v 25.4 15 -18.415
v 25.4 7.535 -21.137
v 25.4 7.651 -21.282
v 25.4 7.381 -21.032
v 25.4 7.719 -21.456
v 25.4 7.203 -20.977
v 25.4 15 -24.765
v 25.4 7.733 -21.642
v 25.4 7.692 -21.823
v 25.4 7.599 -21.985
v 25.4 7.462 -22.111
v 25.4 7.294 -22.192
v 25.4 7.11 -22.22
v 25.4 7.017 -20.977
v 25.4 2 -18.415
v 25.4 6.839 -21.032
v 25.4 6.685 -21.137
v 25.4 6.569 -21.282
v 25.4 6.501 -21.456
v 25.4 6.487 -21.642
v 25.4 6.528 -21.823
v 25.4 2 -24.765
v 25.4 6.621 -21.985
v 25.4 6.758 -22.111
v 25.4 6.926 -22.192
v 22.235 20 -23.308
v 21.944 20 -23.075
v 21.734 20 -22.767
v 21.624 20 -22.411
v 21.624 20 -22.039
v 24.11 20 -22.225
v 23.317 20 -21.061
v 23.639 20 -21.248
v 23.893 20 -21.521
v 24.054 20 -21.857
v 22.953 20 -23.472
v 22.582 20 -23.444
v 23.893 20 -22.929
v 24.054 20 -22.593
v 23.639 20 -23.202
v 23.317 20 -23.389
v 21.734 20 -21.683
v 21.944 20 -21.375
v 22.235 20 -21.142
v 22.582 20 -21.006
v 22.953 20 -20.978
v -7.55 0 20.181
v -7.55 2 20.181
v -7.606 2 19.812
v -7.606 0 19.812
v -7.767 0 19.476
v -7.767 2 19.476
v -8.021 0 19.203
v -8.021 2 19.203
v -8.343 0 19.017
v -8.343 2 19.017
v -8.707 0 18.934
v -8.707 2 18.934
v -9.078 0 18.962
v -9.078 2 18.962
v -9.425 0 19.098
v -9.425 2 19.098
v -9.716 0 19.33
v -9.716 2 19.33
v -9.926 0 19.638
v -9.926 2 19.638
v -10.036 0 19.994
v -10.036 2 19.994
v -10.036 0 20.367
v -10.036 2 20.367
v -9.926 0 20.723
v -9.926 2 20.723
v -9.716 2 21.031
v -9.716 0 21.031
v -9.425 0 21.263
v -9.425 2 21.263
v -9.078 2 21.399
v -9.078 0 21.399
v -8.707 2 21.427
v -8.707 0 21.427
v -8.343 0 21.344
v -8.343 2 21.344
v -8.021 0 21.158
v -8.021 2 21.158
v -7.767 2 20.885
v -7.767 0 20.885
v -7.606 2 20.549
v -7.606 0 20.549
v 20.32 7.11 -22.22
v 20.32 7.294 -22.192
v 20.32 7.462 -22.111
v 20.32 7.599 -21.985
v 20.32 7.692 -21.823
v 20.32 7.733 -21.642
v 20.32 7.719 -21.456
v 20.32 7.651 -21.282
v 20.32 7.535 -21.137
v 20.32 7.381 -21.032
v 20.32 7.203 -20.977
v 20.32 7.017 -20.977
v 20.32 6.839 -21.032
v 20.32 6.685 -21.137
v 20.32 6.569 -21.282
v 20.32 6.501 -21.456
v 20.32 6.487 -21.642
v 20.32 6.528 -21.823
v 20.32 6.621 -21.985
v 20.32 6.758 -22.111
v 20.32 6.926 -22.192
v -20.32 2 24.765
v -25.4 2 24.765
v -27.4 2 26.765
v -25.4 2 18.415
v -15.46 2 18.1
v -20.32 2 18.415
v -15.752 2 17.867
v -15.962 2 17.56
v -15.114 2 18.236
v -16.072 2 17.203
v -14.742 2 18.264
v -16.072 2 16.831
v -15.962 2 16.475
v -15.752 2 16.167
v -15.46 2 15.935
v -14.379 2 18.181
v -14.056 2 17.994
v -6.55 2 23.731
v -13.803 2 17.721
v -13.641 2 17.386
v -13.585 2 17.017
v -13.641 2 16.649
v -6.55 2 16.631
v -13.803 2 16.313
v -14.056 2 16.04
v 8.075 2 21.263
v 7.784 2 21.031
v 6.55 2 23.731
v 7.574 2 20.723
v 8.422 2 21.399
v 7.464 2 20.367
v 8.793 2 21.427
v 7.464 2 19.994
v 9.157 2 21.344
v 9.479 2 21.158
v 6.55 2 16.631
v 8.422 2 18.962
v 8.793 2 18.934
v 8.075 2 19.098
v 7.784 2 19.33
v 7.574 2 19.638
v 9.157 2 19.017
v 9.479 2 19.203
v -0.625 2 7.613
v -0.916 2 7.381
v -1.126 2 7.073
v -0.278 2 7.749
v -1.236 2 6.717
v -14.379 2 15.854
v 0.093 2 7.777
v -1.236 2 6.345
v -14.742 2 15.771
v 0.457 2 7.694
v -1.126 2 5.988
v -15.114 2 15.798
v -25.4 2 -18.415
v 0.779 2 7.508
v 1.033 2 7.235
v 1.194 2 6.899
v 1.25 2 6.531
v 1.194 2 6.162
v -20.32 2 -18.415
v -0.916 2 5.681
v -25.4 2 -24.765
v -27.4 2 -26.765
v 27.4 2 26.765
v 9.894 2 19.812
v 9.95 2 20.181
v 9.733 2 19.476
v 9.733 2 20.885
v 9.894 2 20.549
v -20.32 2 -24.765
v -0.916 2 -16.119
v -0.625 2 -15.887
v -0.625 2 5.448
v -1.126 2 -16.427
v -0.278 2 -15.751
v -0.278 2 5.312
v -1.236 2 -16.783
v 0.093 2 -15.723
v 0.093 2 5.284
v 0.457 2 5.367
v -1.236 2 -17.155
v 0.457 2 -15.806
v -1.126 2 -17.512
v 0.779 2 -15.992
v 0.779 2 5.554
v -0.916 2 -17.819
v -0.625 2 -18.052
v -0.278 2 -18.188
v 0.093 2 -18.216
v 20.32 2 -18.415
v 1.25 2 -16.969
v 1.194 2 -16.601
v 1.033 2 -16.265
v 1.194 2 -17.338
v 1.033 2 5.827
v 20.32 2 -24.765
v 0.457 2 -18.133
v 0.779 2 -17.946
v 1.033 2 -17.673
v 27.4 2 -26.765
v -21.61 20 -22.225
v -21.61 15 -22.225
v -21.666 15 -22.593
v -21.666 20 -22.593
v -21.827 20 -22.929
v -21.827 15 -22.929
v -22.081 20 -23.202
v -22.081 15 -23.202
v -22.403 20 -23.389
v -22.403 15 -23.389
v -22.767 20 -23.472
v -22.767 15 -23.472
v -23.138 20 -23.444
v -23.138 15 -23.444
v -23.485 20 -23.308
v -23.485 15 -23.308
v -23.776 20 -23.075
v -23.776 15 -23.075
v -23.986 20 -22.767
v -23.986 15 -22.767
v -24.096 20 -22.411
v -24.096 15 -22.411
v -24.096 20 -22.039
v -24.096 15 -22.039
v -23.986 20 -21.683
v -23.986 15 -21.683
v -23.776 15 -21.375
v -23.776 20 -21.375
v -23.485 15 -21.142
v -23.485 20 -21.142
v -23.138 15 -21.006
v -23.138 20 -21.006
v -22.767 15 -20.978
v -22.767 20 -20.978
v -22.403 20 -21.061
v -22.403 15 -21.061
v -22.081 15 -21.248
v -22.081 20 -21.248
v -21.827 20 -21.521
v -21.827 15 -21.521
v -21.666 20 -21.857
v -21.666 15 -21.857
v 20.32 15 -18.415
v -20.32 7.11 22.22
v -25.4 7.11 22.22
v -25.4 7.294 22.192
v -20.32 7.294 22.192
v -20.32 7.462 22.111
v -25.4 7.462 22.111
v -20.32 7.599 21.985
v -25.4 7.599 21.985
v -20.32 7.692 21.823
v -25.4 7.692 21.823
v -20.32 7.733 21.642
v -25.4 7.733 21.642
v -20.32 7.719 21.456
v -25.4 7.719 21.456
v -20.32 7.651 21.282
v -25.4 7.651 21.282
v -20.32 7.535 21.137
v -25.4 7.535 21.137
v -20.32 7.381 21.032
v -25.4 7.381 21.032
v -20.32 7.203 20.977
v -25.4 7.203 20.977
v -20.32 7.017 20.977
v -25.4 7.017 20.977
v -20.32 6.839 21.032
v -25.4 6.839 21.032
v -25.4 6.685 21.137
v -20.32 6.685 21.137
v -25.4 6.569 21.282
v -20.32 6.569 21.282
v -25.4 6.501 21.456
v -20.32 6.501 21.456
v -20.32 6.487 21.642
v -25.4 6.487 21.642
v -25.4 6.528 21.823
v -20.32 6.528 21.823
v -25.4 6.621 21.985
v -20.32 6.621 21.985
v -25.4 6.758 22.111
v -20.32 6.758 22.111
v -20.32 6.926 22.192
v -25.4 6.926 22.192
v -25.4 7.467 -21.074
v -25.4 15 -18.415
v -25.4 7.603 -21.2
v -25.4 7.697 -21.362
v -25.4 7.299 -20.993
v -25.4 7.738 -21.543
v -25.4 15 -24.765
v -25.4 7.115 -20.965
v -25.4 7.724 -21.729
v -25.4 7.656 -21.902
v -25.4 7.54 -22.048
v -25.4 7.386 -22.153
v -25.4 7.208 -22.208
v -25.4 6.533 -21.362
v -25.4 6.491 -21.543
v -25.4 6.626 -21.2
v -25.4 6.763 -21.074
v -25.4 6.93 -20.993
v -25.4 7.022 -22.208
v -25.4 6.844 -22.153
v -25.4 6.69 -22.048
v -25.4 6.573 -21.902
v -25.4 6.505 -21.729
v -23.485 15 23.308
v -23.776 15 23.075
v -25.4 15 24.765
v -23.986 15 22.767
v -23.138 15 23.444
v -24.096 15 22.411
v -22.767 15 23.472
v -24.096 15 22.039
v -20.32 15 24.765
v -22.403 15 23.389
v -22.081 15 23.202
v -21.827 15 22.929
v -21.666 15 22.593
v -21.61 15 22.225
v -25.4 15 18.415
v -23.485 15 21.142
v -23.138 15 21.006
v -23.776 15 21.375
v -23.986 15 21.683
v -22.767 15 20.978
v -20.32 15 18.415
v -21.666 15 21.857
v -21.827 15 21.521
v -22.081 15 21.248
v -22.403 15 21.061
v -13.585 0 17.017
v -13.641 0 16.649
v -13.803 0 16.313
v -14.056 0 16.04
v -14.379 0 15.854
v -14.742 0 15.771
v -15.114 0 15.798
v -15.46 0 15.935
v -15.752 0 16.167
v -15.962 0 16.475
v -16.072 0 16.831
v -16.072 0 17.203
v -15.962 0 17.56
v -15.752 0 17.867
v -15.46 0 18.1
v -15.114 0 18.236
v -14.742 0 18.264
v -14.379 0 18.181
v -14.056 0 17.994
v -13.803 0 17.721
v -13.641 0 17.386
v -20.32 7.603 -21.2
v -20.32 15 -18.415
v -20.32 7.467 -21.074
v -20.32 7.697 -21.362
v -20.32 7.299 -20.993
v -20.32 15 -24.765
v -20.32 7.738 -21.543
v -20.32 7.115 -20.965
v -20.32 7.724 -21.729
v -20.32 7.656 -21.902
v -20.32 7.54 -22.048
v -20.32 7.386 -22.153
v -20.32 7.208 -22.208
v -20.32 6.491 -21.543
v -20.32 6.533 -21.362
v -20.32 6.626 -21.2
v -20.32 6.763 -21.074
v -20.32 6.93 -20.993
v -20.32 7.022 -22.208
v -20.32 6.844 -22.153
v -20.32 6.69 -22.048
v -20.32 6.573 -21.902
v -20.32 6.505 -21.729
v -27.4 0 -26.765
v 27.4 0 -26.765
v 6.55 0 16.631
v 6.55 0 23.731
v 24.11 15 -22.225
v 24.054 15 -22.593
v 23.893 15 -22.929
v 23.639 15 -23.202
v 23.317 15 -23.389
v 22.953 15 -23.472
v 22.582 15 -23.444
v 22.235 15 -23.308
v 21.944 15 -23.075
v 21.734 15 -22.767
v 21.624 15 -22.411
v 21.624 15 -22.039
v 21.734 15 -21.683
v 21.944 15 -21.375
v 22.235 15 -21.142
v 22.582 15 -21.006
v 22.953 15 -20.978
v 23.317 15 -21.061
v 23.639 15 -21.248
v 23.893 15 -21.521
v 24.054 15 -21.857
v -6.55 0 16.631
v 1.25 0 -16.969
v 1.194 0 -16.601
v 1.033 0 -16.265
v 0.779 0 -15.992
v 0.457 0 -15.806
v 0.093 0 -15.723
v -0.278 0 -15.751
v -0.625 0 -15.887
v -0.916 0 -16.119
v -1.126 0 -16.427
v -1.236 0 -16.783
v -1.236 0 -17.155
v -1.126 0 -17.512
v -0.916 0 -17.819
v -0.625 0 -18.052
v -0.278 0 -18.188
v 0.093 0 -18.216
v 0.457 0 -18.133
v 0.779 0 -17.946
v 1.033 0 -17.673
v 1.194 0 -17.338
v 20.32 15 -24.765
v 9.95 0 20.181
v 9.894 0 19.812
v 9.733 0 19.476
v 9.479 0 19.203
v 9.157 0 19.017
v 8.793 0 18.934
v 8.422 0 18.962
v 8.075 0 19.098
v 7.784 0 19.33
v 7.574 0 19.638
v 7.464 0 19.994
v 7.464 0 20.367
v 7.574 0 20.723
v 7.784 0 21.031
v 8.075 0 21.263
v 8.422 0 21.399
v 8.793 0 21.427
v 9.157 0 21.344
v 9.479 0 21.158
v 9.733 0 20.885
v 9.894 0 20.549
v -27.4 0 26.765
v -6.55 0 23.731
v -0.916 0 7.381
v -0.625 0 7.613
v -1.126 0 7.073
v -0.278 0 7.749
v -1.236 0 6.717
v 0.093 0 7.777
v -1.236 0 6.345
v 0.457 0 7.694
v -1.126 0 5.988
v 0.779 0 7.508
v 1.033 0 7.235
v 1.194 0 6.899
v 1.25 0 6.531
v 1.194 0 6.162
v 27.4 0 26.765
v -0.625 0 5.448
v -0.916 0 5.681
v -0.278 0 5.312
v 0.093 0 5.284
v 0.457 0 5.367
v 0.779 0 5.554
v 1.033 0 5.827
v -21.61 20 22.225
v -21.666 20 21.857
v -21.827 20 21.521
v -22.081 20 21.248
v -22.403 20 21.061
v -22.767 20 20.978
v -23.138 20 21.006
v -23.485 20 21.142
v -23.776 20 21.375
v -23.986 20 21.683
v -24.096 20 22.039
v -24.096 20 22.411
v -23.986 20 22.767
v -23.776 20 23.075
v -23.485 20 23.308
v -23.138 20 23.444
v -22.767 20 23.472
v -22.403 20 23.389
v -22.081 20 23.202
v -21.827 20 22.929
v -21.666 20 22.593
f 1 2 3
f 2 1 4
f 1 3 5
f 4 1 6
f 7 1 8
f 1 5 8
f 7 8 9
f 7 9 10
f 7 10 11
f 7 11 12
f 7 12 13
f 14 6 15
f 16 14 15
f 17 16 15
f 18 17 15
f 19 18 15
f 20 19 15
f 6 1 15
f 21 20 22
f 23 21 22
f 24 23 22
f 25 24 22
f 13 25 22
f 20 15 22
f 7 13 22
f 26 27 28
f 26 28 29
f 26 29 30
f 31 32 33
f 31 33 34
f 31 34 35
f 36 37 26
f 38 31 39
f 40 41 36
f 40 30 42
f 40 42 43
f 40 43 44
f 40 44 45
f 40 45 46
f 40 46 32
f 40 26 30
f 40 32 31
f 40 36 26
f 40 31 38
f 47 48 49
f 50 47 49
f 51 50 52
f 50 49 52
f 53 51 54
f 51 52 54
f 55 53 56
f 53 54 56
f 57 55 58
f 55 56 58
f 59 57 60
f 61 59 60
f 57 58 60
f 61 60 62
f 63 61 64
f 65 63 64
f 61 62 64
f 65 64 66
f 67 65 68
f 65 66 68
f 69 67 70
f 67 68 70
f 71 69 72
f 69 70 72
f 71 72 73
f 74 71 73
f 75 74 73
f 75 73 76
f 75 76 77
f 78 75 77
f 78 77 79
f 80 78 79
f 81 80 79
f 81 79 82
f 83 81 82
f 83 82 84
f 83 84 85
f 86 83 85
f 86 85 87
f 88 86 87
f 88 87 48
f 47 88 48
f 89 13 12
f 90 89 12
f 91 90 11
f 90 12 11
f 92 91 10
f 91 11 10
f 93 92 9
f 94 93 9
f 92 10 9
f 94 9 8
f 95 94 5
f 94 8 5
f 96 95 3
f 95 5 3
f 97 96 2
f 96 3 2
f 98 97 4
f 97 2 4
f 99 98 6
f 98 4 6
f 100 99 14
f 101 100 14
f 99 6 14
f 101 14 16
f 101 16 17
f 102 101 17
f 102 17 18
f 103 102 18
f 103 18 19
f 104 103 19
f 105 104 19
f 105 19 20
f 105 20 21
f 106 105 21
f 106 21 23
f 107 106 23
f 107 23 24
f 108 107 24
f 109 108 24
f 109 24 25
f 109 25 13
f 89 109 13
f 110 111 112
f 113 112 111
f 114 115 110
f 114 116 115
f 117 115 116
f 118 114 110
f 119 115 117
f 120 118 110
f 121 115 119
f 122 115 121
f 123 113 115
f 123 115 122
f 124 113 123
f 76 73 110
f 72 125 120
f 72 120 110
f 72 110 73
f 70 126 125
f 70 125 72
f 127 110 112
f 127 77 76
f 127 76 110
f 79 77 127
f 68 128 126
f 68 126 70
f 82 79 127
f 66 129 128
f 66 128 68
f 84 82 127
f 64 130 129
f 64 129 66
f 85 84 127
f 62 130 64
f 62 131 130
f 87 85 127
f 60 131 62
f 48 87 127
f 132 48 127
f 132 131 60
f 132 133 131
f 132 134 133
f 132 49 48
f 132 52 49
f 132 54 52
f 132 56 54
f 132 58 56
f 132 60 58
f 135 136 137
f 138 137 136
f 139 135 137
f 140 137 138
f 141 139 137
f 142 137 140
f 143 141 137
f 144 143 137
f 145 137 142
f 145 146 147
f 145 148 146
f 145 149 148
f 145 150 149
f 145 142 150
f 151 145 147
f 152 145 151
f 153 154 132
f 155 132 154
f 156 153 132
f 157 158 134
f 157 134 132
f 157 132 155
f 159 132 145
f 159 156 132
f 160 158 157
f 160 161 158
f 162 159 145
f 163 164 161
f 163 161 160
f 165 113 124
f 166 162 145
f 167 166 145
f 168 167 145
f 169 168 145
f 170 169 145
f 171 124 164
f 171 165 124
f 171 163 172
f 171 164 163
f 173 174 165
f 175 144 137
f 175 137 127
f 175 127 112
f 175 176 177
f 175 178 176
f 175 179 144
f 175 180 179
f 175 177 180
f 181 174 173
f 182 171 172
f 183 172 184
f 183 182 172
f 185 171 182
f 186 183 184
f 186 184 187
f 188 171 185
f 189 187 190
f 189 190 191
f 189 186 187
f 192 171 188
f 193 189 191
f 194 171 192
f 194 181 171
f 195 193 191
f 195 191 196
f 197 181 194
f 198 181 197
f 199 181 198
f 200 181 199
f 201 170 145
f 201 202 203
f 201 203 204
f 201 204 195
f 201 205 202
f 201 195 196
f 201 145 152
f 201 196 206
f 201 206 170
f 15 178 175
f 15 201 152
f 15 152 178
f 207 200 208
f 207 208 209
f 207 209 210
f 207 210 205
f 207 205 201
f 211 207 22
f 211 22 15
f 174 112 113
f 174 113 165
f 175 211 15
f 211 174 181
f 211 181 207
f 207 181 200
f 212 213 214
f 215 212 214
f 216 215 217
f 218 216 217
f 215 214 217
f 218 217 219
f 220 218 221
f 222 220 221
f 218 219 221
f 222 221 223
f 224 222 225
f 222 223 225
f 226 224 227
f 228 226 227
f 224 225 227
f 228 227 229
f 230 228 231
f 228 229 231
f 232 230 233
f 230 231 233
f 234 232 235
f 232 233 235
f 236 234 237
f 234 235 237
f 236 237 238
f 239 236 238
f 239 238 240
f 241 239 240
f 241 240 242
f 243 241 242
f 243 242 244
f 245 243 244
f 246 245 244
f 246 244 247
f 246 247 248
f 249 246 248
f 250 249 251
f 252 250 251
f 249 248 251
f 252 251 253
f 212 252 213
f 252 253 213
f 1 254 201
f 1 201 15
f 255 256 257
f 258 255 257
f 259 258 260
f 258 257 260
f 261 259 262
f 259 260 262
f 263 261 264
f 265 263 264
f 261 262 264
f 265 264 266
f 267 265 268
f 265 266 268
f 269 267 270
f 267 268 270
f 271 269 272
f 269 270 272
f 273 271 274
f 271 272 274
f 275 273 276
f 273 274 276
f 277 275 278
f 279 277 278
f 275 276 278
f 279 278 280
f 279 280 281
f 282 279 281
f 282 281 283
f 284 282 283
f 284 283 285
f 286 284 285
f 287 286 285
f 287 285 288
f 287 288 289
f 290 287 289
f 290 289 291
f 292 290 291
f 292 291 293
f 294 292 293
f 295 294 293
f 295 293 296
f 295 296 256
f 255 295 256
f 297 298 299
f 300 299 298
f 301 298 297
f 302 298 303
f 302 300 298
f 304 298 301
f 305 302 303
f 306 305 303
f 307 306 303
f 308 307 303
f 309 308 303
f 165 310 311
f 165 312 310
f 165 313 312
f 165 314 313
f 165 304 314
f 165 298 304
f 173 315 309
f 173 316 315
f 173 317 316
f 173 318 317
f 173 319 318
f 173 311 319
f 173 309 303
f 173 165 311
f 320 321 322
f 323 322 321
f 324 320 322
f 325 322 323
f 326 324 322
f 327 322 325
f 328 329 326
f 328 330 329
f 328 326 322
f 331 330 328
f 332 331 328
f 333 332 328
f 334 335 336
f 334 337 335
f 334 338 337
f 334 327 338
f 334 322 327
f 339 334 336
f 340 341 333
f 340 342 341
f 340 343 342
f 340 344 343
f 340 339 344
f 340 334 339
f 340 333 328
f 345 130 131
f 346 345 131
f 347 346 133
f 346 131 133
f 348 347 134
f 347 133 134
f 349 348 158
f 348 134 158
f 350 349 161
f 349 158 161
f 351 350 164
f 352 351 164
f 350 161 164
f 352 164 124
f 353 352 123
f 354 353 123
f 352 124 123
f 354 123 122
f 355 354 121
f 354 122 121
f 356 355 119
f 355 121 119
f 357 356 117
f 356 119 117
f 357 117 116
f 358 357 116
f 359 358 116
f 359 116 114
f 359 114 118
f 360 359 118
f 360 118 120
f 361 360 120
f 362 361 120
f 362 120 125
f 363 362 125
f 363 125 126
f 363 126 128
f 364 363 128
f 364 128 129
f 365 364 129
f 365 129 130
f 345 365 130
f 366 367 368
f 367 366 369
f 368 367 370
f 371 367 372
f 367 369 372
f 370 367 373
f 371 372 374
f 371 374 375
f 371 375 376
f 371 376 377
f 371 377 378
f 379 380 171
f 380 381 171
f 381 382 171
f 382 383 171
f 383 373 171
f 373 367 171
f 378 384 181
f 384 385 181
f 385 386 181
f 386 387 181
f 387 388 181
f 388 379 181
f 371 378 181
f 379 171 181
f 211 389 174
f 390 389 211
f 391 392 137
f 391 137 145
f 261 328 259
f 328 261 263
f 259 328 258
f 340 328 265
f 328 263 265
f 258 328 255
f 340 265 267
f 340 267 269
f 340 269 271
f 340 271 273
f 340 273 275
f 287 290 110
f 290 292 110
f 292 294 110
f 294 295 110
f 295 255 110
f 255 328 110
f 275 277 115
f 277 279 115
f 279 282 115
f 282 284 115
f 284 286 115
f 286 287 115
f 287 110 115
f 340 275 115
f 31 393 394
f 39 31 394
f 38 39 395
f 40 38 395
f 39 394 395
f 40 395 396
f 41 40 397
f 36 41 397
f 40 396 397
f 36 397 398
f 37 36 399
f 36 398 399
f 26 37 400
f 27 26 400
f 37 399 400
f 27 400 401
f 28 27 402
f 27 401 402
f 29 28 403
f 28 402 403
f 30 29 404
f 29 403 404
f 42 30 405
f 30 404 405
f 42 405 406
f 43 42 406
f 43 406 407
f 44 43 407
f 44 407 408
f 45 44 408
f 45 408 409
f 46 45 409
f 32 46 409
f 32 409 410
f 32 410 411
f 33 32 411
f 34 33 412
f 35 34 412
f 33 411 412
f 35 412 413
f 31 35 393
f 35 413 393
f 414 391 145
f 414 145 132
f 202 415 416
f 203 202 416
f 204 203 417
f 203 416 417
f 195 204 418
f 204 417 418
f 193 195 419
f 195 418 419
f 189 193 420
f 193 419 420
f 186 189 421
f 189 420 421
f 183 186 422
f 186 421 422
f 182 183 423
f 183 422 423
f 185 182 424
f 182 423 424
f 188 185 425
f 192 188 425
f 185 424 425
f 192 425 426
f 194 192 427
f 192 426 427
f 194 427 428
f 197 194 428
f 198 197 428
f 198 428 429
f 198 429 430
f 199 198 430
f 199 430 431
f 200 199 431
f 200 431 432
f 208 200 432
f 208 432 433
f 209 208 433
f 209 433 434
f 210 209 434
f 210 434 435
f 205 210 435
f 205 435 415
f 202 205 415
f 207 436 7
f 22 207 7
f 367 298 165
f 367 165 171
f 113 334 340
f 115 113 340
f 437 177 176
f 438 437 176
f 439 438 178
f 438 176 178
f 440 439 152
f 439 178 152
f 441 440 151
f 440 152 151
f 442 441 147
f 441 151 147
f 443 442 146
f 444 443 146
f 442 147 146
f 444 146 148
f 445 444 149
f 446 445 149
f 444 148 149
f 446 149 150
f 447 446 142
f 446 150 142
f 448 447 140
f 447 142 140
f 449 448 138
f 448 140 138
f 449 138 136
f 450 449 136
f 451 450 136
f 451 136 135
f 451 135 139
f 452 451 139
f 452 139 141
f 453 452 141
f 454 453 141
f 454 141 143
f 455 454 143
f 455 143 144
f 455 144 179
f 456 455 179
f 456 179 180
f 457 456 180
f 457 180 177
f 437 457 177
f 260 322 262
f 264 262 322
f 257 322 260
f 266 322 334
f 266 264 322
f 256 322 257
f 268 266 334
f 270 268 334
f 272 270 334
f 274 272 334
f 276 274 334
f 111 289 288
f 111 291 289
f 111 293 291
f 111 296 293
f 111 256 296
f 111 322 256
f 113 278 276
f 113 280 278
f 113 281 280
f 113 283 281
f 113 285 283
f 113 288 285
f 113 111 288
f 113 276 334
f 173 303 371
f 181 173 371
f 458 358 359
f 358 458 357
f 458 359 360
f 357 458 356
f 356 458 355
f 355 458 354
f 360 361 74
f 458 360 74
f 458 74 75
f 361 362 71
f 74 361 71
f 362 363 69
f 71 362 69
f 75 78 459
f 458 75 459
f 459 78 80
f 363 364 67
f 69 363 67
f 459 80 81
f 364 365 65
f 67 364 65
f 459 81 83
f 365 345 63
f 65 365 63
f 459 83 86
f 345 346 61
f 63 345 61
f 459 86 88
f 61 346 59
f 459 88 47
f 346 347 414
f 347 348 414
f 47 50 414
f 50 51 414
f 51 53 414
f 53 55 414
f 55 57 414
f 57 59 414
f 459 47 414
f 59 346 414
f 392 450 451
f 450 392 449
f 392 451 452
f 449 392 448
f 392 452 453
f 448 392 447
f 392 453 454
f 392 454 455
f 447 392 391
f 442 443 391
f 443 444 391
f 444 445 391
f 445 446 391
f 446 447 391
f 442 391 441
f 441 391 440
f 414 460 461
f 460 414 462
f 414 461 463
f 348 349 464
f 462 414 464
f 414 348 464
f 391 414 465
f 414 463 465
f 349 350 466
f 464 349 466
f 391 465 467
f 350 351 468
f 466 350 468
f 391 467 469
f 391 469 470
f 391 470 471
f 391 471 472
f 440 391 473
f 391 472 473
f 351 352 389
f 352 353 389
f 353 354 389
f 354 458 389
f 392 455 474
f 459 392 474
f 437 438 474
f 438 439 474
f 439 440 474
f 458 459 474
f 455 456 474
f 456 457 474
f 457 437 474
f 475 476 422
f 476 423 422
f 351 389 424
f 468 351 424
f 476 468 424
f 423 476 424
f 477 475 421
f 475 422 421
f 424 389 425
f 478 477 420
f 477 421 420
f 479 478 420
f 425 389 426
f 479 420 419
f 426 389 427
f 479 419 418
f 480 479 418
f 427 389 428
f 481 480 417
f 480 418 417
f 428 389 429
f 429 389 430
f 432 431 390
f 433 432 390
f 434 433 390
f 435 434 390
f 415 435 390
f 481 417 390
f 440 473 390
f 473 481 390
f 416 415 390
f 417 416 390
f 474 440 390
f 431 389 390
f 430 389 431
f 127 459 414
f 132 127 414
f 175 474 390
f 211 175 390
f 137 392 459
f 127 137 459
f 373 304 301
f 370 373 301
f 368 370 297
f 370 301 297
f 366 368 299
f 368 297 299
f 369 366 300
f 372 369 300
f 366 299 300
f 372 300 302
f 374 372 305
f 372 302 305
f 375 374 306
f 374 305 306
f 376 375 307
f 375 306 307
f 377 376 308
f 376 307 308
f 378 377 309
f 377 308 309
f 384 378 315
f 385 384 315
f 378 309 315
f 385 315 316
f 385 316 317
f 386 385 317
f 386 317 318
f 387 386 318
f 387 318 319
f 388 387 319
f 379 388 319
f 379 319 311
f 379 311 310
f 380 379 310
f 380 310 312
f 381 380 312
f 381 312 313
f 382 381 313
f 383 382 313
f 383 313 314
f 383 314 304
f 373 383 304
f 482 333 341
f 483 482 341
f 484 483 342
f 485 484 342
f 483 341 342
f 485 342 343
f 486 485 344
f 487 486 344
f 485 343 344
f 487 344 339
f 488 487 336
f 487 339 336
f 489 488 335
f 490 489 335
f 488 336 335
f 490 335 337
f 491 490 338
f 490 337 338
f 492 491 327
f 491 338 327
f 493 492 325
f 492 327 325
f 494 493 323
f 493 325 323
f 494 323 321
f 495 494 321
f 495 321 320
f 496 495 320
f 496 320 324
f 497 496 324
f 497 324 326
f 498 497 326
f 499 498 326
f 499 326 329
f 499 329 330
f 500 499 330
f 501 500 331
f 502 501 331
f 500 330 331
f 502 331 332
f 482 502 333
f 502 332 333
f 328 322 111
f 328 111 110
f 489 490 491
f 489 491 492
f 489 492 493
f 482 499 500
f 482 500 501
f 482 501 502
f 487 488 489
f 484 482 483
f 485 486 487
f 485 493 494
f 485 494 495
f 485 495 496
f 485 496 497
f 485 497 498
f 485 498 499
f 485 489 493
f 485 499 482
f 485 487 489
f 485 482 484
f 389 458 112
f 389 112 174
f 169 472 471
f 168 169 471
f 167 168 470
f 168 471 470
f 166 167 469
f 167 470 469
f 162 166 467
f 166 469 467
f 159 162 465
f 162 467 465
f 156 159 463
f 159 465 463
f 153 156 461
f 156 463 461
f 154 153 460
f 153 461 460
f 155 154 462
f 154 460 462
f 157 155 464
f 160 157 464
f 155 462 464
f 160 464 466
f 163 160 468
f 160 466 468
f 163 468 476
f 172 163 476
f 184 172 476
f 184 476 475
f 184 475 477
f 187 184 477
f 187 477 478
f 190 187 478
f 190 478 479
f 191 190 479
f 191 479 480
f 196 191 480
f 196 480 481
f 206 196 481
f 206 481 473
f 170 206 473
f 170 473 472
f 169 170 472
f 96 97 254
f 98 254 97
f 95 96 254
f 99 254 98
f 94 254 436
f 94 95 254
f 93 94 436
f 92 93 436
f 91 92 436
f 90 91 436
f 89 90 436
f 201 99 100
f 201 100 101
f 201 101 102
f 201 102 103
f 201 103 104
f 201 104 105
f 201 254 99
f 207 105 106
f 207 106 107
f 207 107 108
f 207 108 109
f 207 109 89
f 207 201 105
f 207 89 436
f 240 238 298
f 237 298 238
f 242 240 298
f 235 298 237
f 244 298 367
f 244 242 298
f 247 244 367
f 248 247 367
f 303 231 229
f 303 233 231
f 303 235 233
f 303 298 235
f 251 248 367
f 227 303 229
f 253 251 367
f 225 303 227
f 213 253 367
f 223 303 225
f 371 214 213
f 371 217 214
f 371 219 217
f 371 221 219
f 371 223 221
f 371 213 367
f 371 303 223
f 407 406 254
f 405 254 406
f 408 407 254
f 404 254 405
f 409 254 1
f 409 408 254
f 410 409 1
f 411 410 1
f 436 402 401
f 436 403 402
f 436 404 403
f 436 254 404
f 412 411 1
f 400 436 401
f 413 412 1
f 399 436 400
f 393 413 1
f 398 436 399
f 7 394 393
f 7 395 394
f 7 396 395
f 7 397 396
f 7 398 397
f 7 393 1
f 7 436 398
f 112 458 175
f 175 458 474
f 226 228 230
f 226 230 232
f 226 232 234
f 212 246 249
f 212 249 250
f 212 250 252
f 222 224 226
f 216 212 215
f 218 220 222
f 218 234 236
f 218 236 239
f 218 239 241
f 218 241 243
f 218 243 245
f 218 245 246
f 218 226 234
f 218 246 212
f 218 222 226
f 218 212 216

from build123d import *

# Parameters (mm, degrees)
SKETCH2_W           = 54.8
SKETCH2_H           = 53.53
BOSS_EXTRUDE1_DEPTH = 2
SKETCH3_W           = 5.08
SKETCH3_H           = 6.35
BOSS_EXTRUDE2_DEPTH = 13
SKETCH6_R           = 1.25
BOSS_EXTRUDE3_DEPTH = 5
CUT_EXTRUDE1_REACH  = 22
SKETCH7_W           = 13.1
SKETCH7_H           = 7.1
CUT_EXTRUDE2_REACH  = 22
SKETCH8_R           = 1.25
CUT_EXTRUDE4_REACH  = 54.8
SKETCH9_R           = 0.625
CUT_EXTRUDE5_REACH  = 54.8
SKETCH10_R          = 0.625
CUT_EXTRUDE6_REACH  = 54.8
SKETCH11_R          = 0.625
CUT_EXTRUDE7_REACH  = 4
SKETCH12_R          = 1.25
CUT_EXTRUDE8_REACH  = 4
SKETCH13_R          = 1.25


with BuildPart() as part:
    # Sketch2 → Boss-Extrude1 (new body)
    with BuildSketch(Plane(origin=(0, 0, 0), x_dir=(1, 0, 0), z_dir=(0, 1, 0))):
        Rectangle(SKETCH2_W, SKETCH2_H)
    extrude(amount=BOSS_EXTRUDE1_DEPTH)

    # Sketch3 → Boss-Extrude2 (add)
    with BuildSketch(Plane(origin=(0, 2, 0), x_dir=(1, 0, 0), z_dir=(0, 1, 0))):
        with Locations((-22.86, 21.59)):
            Rectangle(SKETCH3_W, SKETCH3_H)
        with Locations((22.86, 21.59)):
            Rectangle(SKETCH3_W, SKETCH3_H)
        with Locations((-22.86, -21.59)):
            Rectangle(SKETCH3_W, SKETCH3_H)
    extrude(amount=BOSS_EXTRUDE2_DEPTH)

    # Sketch6 → Boss-Extrude3 (add)
    with BuildSketch(Plane(origin=(0, 15, 0), x_dir=(1, 0, 0), z_dir=(0, 1, 0))):
        with Locations((-22.86, 22.225)):
            Circle(SKETCH6_R)
        with Locations((22.86, 22.225)):
            Circle(SKETCH6_R)
        with Locations((-22.86, -22.225)):
            Circle(SKETCH6_R)
    extrude(amount=BOSS_EXTRUDE3_DEPTH)

    # Sketch7 → Cut-Extrude1 (cut, up to next)
    with BuildSketch(Plane(origin=(0, 0, 0), x_dir=(-1, 0, 0), z_dir=(0, -1, 0)), mode=Mode.PRIVATE) as cut_extrude1_sk1:
        with Locations((0, -20.180596319)):
            Rectangle(SKETCH7_W, SKETCH7_H)
    cut_extrude1_tool1 = extrude(cut_extrude1_sk1.sketch, amount=-CUT_EXTRUDE1_REACH, mode=Mode.PRIVATE) & part.part
    add(cut_extrude1_tool1.solids().sort_by_distance((0, 0, 20.180596))[0], mode=Mode.SUBTRACT)

    # Sketch8 → Cut-Extrude2 (cut, up to next)
    with BuildSketch(Plane.XZ, mode=Mode.PRIVATE) as cut_extrude2_sk1:
        with Locations((0, 6.530805807)):
            Circle(SKETCH8_R)
    cut_extrude2_tool1 = extrude(cut_extrude2_sk1.sketch, amount=-CUT_EXTRUDE2_REACH, mode=Mode.PRIVATE) & part.part
    add(cut_extrude2_tool1.solids().sort_by_distance((0, 0, 6.530806))[0], mode=Mode.SUBTRACT)
    # Sketch8 → Cut-Extrude2 (cut, up to next)
    with BuildSketch(Plane.XZ, mode=Mode.PRIVATE) as cut_extrude2_sk2:
        with Locations((0, -16.969194193)):
            Circle(SKETCH8_R)
    cut_extrude2_tool2 = extrude(cut_extrude2_sk2.sketch, amount=-CUT_EXTRUDE2_REACH, mode=Mode.PRIVATE) & part.part
    add(cut_extrude2_tool2.solids().sort_by_distance((0, 0, -16.969194))[0], mode=Mode.SUBTRACT)

    # Sketch9 → Cut-Extrude4 (cut, up to next)
    with BuildSketch(Plane.ZY.offset(25.4), mode=Mode.PRIVATE) as cut_extrude4_sk1:
        with Locations((-21.59, 7.11470595)):
            Circle(SKETCH9_R)
    cut_extrude4_tool1 = extrude(cut_extrude4_sk1.sketch, amount=-CUT_EXTRUDE4_REACH, mode=Mode.PRIVATE) & part.part
    add(cut_extrude4_tool1.solids().sort_by_distance((-25.4, 7.114706, -21.59))[0], mode=Mode.SUBTRACT)

    # Sketch10 → Cut-Extrude5 (cut, up to next)
    with BuildSketch(Plane(origin=(25.4, 0, 0), x_dir=(0, 0, -1), z_dir=(1, 0, 0)), mode=Mode.PRIVATE) as cut_extrude5_sk1:
        with Locations((21.595, 7.11)):
            Circle(SKETCH10_R)
    cut_extrude5_tool1 = extrude(cut_extrude5_sk1.sketch, amount=-CUT_EXTRUDE5_REACH, mode=Mode.PRIVATE) & part.part
    add(cut_extrude5_tool1.solids().sort_by_distance((25.4, 7.11, -21.595))[0], mode=Mode.SUBTRACT)

    # Sketch11 → Cut-Extrude6 (cut, up to next)
    with BuildSketch(Plane.ZY.offset(25.4), mode=Mode.PRIVATE) as cut_extrude6_sk1:
        with Locations((21.595, 7.11)):
            Circle(SKETCH11_R)
    cut_extrude6_tool1 = extrude(cut_extrude6_sk1.sketch, amount=-CUT_EXTRUDE6_REACH, mode=Mode.PRIVATE) & part.part
    add(cut_extrude6_tool1.solids().sort_by_distance((-25.4, 7.11, 21.595))[0], mode=Mode.SUBTRACT)

    # Sketch12 → Cut-Extrude7 (cut, up to next)
    with BuildSketch(Plane(origin=(0, 2, 0), x_dir=(1, 0, 0), z_dir=(0, 1, 0)), mode=Mode.PRIVATE) as cut_extrude7_sk1:
        with Locations((-14.835465402, -17.017151491)):
            Circle(SKETCH12_R)
    cut_extrude7_tool1 = extrude(cut_extrude7_sk1.sketch, amount=-CUT_EXTRUDE7_REACH, mode=Mode.PRIVATE) & part.part
    add(cut_extrude7_tool1.solids().sort_by_distance((-14.835465, 2, 17.017151))[0], mode=Mode.SUBTRACT)

    # Sketch13 → Cut-Extrude8 (cut, up to next)
    with BuildSketch(Plane(origin=(0, 2, 0), x_dir=(1, 0, 0), z_dir=(0, 1, 0)), mode=Mode.PRIVATE) as cut_extrude8_sk1:
        with Locations((-8.8, -20.180596319)):
            Circle(SKETCH13_R)
    cut_extrude8_tool1 = extrude(cut_extrude8_sk1.sketch, amount=-CUT_EXTRUDE8_REACH, mode=Mode.PRIVATE) & part.part
    add(cut_extrude8_tool1.solids().sort_by_distance((-8.8, 2, 20.180596))[0], mode=Mode.SUBTRACT)
    # Sketch13 → Cut-Extrude8 (cut, up to next)
    with BuildSketch(Plane(origin=(0, 2, 0), x_dir=(1, 0, 0), z_dir=(0, 1, 0)), mode=Mode.PRIVATE) as cut_extrude8_sk2:
        with Locations((8.7, -20.180596319)):
            Circle(SKETCH13_R)
    cut_extrude8_tool2 = extrude(cut_extrude8_sk2.sketch, amount=-CUT_EXTRUDE8_REACH, mode=Mode.PRIVATE) & part.part
    add(cut_extrude8_tool2.solids().sort_by_distance((8.7, 2, 20.180596))[0], mode=Mode.SUBTRACT)


solid = part.part
